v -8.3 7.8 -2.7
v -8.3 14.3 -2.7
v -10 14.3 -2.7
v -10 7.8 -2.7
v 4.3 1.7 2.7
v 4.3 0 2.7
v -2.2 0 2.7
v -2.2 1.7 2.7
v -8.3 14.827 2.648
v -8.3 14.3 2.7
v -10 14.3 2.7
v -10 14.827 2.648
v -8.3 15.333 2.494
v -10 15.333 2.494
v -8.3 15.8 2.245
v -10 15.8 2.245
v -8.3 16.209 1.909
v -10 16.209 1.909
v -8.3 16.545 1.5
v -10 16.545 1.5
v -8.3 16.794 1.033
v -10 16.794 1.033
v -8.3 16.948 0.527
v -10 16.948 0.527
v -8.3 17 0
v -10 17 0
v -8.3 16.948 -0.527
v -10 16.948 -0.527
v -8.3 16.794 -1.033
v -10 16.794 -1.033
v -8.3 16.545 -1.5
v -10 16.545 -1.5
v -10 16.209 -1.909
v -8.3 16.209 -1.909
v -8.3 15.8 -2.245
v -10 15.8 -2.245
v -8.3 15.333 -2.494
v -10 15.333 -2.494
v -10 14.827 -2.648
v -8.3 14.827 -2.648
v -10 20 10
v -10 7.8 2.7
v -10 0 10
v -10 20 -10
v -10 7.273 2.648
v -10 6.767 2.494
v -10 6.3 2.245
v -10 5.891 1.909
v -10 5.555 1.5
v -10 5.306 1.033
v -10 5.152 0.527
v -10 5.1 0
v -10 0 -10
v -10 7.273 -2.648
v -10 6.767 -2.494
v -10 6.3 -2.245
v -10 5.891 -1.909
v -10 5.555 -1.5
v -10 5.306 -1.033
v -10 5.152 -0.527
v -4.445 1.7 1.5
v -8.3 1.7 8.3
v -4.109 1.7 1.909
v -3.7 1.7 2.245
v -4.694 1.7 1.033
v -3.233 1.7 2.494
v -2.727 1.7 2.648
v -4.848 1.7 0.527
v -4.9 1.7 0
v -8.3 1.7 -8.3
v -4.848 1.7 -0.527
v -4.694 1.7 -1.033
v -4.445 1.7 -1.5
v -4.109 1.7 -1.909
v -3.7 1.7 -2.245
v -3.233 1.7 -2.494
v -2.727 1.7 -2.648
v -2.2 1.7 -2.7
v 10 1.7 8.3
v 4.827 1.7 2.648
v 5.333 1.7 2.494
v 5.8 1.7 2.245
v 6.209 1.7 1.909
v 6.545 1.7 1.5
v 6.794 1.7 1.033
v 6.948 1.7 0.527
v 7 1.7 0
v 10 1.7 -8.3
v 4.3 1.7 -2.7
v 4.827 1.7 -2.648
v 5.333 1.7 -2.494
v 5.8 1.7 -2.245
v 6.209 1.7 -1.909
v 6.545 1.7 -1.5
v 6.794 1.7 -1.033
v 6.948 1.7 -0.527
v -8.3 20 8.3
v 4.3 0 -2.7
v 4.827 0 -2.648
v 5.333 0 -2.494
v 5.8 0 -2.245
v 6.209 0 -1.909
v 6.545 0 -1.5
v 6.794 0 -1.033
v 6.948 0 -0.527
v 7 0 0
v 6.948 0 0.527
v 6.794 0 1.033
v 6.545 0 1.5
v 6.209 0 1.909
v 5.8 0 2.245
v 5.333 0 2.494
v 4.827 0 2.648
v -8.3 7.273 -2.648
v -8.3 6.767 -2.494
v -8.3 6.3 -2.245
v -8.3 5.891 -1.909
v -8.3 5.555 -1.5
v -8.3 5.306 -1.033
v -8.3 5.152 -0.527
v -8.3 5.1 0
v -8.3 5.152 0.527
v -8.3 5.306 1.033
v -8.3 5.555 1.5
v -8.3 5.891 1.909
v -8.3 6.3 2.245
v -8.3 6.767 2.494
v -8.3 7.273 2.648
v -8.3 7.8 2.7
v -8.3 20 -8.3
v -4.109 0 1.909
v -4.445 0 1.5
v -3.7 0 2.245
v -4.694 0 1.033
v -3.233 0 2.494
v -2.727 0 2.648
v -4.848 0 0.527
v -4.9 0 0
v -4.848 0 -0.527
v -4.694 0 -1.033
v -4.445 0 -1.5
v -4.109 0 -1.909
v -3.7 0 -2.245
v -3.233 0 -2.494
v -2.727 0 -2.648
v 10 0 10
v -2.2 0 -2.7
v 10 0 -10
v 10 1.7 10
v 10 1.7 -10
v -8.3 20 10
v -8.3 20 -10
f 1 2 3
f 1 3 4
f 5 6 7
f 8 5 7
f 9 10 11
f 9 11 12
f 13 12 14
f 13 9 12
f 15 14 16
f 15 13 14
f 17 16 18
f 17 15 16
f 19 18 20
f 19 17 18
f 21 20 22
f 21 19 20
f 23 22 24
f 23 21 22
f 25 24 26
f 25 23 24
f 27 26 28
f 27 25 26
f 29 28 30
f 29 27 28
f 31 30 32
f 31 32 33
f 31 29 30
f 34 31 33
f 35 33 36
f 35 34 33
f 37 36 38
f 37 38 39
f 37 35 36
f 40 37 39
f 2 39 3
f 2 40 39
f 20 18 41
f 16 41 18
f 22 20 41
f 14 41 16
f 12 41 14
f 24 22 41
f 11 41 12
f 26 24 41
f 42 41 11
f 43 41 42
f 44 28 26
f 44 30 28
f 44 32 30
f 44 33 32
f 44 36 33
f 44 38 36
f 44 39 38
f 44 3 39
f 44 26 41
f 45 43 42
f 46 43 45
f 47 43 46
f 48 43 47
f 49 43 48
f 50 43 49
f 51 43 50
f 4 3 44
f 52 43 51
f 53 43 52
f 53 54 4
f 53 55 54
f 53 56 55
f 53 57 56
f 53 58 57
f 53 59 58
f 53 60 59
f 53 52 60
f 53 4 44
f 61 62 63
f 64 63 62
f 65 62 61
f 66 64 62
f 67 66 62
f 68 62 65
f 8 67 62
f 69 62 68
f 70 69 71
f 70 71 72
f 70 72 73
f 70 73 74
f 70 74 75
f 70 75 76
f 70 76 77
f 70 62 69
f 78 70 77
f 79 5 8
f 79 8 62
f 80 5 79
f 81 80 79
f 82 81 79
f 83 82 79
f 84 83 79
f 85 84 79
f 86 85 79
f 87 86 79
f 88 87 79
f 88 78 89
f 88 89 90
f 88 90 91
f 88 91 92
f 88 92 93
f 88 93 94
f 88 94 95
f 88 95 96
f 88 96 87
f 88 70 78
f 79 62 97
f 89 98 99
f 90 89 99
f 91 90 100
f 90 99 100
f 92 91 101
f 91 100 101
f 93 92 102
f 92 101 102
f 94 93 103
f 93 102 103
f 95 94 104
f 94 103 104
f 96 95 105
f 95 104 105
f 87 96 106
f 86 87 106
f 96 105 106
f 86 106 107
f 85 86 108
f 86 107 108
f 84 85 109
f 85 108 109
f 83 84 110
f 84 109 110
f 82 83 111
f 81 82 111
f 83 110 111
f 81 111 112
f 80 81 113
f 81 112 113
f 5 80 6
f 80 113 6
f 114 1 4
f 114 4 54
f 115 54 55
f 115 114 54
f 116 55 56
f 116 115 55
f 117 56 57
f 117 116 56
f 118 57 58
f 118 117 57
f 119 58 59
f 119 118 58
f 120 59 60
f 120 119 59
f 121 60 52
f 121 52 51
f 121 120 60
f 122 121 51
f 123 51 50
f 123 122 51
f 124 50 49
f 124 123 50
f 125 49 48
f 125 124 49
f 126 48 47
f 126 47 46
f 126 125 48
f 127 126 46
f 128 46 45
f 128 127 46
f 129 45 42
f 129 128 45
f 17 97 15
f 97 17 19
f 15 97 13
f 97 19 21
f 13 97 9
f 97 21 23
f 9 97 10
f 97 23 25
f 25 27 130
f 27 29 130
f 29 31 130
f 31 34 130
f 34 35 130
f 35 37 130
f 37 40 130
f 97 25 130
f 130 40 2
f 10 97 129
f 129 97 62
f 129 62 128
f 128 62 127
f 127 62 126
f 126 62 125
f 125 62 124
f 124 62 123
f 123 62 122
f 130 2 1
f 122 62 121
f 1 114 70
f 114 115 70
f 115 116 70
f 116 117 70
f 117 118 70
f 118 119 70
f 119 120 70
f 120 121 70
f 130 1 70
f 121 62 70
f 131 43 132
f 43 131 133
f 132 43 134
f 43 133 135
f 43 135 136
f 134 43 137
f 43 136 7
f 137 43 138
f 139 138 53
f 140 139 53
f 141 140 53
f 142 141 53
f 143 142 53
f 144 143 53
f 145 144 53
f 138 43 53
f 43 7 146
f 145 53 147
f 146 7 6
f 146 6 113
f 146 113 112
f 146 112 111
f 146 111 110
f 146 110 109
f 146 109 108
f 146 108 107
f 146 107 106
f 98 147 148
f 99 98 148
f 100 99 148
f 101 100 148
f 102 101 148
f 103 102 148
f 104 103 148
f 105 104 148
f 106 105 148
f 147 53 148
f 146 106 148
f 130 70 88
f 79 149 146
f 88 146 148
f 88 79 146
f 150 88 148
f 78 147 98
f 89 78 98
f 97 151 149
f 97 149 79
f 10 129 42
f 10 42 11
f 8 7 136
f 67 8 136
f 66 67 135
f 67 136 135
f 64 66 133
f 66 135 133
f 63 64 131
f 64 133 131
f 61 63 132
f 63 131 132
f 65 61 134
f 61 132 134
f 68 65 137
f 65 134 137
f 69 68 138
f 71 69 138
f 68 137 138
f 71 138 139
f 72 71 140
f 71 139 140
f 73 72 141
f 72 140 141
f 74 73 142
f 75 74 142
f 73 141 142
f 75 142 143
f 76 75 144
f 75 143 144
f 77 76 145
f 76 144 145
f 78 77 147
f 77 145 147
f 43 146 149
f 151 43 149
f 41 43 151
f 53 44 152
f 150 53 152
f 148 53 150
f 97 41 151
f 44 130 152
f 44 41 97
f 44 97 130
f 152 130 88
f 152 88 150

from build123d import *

# Parameters (mm, degrees)
SKICA1_W                 = 20
SKICA1_H                 = 20
P_IDAT_VYSUNUT_M1_DEPTH  = 1.7
SKICA2_W                 = 1.7
SKICA2_H                 = 20
P_IDAT_VYSUNUT_M2_DEPTH  = 18.3
ODEBRAT_VYSUNUT_M1_DEPTH = 1.7
SKICA4_W                 = 1.7
SKICA4_H                 = 18.3
P_IDAT_VYSUNUT_M3_DEPTH  = 18.3
ZKOSEN_1_SIZE            = 18.3


with BuildPart() as part:
    # Skica1 → Přidat vysunutím1 (new body)
    with BuildSketch(Plane(origin=(0, 0, 0), x_dir=(1, 0, 0), z_dir=(0, 1, 0))):
        Rectangle(SKICA1_W, SKICA1_H)
        with BuildLine():
            Line((-2.2, 2.7), (4.3, 2.7))
            ThreePointArc((4.3, 2.7), (7, 0), (4.3, -2.7))
            Line((4.3, -2.7), (-2.2, -2.7))
            ThreePointArc((-2.2, -2.7), (-4.9, 0), (-2.2, 2.7))
        make_face(mode=Mode.SUBTRACT)
    extrude(amount=P_IDAT_VYSUNUT_M1_DEPTH)

    # Skica2 → Přidat vysunutím2 (add)
    with BuildSketch(Plane(origin=(0, 1.7, 0), x_dir=(1, 0, 0), z_dir=(0, 1, 0))):
        with Locations((-9.15, 0)):
            Rectangle(SKICA2_W, SKICA2_H)
    extrude(amount=P_IDAT_VYSUNUT_M2_DEPTH)

    # Skica3 → Odebrat vysunutím1 (cut)
    with BuildSketch(Plane(origin=(-8.3, 0, 0), x_dir=(0, 0, -1), z_dir=(1, 0, 0))):
        with BuildLine():
            Line((2.7, 14.3), (2.7, 7.8))
            ThreePointArc((2.7, 7.8), (0, 5.1), (-2.7, 7.8))
            Line((-2.7, 7.8), (-2.7, 14.3))
            ThreePointArc((-2.7, 14.3), (0, 17), (2.7, 14.3))
        make_face()
    extrude(amount=-ODEBRAT_VYSUNUT_M1_DEPTH, mode=Mode.SUBTRACT)

    # Skica4 → Přidat vysunutím3 (add)
    with BuildSketch(Plane(origin=(-8.3, 0, 0), x_dir=(0, 0, -1), z_dir=(1, 0, 0))):
        with Locations((-9.15, 10.85)):
            Rectangle(SKICA4_W, SKICA4_H)
        with Locations((9.15, 10.85)):
            Rectangle(SKICA4_W, SKICA4_H)
    extrude(amount=P_IDAT_VYSUNUT_M3_DEPTH)

    # Zkosení1
    zkosen_1_edges = [part.edges().sort_by_distance(p)[0] for p in [
        (10, 20, -9.15),
        (10, 20, 9.15),
    ]]
    chamfer(zkosen_1_edges, length=ZKOSEN_1_SIZE)


solid = part.part
